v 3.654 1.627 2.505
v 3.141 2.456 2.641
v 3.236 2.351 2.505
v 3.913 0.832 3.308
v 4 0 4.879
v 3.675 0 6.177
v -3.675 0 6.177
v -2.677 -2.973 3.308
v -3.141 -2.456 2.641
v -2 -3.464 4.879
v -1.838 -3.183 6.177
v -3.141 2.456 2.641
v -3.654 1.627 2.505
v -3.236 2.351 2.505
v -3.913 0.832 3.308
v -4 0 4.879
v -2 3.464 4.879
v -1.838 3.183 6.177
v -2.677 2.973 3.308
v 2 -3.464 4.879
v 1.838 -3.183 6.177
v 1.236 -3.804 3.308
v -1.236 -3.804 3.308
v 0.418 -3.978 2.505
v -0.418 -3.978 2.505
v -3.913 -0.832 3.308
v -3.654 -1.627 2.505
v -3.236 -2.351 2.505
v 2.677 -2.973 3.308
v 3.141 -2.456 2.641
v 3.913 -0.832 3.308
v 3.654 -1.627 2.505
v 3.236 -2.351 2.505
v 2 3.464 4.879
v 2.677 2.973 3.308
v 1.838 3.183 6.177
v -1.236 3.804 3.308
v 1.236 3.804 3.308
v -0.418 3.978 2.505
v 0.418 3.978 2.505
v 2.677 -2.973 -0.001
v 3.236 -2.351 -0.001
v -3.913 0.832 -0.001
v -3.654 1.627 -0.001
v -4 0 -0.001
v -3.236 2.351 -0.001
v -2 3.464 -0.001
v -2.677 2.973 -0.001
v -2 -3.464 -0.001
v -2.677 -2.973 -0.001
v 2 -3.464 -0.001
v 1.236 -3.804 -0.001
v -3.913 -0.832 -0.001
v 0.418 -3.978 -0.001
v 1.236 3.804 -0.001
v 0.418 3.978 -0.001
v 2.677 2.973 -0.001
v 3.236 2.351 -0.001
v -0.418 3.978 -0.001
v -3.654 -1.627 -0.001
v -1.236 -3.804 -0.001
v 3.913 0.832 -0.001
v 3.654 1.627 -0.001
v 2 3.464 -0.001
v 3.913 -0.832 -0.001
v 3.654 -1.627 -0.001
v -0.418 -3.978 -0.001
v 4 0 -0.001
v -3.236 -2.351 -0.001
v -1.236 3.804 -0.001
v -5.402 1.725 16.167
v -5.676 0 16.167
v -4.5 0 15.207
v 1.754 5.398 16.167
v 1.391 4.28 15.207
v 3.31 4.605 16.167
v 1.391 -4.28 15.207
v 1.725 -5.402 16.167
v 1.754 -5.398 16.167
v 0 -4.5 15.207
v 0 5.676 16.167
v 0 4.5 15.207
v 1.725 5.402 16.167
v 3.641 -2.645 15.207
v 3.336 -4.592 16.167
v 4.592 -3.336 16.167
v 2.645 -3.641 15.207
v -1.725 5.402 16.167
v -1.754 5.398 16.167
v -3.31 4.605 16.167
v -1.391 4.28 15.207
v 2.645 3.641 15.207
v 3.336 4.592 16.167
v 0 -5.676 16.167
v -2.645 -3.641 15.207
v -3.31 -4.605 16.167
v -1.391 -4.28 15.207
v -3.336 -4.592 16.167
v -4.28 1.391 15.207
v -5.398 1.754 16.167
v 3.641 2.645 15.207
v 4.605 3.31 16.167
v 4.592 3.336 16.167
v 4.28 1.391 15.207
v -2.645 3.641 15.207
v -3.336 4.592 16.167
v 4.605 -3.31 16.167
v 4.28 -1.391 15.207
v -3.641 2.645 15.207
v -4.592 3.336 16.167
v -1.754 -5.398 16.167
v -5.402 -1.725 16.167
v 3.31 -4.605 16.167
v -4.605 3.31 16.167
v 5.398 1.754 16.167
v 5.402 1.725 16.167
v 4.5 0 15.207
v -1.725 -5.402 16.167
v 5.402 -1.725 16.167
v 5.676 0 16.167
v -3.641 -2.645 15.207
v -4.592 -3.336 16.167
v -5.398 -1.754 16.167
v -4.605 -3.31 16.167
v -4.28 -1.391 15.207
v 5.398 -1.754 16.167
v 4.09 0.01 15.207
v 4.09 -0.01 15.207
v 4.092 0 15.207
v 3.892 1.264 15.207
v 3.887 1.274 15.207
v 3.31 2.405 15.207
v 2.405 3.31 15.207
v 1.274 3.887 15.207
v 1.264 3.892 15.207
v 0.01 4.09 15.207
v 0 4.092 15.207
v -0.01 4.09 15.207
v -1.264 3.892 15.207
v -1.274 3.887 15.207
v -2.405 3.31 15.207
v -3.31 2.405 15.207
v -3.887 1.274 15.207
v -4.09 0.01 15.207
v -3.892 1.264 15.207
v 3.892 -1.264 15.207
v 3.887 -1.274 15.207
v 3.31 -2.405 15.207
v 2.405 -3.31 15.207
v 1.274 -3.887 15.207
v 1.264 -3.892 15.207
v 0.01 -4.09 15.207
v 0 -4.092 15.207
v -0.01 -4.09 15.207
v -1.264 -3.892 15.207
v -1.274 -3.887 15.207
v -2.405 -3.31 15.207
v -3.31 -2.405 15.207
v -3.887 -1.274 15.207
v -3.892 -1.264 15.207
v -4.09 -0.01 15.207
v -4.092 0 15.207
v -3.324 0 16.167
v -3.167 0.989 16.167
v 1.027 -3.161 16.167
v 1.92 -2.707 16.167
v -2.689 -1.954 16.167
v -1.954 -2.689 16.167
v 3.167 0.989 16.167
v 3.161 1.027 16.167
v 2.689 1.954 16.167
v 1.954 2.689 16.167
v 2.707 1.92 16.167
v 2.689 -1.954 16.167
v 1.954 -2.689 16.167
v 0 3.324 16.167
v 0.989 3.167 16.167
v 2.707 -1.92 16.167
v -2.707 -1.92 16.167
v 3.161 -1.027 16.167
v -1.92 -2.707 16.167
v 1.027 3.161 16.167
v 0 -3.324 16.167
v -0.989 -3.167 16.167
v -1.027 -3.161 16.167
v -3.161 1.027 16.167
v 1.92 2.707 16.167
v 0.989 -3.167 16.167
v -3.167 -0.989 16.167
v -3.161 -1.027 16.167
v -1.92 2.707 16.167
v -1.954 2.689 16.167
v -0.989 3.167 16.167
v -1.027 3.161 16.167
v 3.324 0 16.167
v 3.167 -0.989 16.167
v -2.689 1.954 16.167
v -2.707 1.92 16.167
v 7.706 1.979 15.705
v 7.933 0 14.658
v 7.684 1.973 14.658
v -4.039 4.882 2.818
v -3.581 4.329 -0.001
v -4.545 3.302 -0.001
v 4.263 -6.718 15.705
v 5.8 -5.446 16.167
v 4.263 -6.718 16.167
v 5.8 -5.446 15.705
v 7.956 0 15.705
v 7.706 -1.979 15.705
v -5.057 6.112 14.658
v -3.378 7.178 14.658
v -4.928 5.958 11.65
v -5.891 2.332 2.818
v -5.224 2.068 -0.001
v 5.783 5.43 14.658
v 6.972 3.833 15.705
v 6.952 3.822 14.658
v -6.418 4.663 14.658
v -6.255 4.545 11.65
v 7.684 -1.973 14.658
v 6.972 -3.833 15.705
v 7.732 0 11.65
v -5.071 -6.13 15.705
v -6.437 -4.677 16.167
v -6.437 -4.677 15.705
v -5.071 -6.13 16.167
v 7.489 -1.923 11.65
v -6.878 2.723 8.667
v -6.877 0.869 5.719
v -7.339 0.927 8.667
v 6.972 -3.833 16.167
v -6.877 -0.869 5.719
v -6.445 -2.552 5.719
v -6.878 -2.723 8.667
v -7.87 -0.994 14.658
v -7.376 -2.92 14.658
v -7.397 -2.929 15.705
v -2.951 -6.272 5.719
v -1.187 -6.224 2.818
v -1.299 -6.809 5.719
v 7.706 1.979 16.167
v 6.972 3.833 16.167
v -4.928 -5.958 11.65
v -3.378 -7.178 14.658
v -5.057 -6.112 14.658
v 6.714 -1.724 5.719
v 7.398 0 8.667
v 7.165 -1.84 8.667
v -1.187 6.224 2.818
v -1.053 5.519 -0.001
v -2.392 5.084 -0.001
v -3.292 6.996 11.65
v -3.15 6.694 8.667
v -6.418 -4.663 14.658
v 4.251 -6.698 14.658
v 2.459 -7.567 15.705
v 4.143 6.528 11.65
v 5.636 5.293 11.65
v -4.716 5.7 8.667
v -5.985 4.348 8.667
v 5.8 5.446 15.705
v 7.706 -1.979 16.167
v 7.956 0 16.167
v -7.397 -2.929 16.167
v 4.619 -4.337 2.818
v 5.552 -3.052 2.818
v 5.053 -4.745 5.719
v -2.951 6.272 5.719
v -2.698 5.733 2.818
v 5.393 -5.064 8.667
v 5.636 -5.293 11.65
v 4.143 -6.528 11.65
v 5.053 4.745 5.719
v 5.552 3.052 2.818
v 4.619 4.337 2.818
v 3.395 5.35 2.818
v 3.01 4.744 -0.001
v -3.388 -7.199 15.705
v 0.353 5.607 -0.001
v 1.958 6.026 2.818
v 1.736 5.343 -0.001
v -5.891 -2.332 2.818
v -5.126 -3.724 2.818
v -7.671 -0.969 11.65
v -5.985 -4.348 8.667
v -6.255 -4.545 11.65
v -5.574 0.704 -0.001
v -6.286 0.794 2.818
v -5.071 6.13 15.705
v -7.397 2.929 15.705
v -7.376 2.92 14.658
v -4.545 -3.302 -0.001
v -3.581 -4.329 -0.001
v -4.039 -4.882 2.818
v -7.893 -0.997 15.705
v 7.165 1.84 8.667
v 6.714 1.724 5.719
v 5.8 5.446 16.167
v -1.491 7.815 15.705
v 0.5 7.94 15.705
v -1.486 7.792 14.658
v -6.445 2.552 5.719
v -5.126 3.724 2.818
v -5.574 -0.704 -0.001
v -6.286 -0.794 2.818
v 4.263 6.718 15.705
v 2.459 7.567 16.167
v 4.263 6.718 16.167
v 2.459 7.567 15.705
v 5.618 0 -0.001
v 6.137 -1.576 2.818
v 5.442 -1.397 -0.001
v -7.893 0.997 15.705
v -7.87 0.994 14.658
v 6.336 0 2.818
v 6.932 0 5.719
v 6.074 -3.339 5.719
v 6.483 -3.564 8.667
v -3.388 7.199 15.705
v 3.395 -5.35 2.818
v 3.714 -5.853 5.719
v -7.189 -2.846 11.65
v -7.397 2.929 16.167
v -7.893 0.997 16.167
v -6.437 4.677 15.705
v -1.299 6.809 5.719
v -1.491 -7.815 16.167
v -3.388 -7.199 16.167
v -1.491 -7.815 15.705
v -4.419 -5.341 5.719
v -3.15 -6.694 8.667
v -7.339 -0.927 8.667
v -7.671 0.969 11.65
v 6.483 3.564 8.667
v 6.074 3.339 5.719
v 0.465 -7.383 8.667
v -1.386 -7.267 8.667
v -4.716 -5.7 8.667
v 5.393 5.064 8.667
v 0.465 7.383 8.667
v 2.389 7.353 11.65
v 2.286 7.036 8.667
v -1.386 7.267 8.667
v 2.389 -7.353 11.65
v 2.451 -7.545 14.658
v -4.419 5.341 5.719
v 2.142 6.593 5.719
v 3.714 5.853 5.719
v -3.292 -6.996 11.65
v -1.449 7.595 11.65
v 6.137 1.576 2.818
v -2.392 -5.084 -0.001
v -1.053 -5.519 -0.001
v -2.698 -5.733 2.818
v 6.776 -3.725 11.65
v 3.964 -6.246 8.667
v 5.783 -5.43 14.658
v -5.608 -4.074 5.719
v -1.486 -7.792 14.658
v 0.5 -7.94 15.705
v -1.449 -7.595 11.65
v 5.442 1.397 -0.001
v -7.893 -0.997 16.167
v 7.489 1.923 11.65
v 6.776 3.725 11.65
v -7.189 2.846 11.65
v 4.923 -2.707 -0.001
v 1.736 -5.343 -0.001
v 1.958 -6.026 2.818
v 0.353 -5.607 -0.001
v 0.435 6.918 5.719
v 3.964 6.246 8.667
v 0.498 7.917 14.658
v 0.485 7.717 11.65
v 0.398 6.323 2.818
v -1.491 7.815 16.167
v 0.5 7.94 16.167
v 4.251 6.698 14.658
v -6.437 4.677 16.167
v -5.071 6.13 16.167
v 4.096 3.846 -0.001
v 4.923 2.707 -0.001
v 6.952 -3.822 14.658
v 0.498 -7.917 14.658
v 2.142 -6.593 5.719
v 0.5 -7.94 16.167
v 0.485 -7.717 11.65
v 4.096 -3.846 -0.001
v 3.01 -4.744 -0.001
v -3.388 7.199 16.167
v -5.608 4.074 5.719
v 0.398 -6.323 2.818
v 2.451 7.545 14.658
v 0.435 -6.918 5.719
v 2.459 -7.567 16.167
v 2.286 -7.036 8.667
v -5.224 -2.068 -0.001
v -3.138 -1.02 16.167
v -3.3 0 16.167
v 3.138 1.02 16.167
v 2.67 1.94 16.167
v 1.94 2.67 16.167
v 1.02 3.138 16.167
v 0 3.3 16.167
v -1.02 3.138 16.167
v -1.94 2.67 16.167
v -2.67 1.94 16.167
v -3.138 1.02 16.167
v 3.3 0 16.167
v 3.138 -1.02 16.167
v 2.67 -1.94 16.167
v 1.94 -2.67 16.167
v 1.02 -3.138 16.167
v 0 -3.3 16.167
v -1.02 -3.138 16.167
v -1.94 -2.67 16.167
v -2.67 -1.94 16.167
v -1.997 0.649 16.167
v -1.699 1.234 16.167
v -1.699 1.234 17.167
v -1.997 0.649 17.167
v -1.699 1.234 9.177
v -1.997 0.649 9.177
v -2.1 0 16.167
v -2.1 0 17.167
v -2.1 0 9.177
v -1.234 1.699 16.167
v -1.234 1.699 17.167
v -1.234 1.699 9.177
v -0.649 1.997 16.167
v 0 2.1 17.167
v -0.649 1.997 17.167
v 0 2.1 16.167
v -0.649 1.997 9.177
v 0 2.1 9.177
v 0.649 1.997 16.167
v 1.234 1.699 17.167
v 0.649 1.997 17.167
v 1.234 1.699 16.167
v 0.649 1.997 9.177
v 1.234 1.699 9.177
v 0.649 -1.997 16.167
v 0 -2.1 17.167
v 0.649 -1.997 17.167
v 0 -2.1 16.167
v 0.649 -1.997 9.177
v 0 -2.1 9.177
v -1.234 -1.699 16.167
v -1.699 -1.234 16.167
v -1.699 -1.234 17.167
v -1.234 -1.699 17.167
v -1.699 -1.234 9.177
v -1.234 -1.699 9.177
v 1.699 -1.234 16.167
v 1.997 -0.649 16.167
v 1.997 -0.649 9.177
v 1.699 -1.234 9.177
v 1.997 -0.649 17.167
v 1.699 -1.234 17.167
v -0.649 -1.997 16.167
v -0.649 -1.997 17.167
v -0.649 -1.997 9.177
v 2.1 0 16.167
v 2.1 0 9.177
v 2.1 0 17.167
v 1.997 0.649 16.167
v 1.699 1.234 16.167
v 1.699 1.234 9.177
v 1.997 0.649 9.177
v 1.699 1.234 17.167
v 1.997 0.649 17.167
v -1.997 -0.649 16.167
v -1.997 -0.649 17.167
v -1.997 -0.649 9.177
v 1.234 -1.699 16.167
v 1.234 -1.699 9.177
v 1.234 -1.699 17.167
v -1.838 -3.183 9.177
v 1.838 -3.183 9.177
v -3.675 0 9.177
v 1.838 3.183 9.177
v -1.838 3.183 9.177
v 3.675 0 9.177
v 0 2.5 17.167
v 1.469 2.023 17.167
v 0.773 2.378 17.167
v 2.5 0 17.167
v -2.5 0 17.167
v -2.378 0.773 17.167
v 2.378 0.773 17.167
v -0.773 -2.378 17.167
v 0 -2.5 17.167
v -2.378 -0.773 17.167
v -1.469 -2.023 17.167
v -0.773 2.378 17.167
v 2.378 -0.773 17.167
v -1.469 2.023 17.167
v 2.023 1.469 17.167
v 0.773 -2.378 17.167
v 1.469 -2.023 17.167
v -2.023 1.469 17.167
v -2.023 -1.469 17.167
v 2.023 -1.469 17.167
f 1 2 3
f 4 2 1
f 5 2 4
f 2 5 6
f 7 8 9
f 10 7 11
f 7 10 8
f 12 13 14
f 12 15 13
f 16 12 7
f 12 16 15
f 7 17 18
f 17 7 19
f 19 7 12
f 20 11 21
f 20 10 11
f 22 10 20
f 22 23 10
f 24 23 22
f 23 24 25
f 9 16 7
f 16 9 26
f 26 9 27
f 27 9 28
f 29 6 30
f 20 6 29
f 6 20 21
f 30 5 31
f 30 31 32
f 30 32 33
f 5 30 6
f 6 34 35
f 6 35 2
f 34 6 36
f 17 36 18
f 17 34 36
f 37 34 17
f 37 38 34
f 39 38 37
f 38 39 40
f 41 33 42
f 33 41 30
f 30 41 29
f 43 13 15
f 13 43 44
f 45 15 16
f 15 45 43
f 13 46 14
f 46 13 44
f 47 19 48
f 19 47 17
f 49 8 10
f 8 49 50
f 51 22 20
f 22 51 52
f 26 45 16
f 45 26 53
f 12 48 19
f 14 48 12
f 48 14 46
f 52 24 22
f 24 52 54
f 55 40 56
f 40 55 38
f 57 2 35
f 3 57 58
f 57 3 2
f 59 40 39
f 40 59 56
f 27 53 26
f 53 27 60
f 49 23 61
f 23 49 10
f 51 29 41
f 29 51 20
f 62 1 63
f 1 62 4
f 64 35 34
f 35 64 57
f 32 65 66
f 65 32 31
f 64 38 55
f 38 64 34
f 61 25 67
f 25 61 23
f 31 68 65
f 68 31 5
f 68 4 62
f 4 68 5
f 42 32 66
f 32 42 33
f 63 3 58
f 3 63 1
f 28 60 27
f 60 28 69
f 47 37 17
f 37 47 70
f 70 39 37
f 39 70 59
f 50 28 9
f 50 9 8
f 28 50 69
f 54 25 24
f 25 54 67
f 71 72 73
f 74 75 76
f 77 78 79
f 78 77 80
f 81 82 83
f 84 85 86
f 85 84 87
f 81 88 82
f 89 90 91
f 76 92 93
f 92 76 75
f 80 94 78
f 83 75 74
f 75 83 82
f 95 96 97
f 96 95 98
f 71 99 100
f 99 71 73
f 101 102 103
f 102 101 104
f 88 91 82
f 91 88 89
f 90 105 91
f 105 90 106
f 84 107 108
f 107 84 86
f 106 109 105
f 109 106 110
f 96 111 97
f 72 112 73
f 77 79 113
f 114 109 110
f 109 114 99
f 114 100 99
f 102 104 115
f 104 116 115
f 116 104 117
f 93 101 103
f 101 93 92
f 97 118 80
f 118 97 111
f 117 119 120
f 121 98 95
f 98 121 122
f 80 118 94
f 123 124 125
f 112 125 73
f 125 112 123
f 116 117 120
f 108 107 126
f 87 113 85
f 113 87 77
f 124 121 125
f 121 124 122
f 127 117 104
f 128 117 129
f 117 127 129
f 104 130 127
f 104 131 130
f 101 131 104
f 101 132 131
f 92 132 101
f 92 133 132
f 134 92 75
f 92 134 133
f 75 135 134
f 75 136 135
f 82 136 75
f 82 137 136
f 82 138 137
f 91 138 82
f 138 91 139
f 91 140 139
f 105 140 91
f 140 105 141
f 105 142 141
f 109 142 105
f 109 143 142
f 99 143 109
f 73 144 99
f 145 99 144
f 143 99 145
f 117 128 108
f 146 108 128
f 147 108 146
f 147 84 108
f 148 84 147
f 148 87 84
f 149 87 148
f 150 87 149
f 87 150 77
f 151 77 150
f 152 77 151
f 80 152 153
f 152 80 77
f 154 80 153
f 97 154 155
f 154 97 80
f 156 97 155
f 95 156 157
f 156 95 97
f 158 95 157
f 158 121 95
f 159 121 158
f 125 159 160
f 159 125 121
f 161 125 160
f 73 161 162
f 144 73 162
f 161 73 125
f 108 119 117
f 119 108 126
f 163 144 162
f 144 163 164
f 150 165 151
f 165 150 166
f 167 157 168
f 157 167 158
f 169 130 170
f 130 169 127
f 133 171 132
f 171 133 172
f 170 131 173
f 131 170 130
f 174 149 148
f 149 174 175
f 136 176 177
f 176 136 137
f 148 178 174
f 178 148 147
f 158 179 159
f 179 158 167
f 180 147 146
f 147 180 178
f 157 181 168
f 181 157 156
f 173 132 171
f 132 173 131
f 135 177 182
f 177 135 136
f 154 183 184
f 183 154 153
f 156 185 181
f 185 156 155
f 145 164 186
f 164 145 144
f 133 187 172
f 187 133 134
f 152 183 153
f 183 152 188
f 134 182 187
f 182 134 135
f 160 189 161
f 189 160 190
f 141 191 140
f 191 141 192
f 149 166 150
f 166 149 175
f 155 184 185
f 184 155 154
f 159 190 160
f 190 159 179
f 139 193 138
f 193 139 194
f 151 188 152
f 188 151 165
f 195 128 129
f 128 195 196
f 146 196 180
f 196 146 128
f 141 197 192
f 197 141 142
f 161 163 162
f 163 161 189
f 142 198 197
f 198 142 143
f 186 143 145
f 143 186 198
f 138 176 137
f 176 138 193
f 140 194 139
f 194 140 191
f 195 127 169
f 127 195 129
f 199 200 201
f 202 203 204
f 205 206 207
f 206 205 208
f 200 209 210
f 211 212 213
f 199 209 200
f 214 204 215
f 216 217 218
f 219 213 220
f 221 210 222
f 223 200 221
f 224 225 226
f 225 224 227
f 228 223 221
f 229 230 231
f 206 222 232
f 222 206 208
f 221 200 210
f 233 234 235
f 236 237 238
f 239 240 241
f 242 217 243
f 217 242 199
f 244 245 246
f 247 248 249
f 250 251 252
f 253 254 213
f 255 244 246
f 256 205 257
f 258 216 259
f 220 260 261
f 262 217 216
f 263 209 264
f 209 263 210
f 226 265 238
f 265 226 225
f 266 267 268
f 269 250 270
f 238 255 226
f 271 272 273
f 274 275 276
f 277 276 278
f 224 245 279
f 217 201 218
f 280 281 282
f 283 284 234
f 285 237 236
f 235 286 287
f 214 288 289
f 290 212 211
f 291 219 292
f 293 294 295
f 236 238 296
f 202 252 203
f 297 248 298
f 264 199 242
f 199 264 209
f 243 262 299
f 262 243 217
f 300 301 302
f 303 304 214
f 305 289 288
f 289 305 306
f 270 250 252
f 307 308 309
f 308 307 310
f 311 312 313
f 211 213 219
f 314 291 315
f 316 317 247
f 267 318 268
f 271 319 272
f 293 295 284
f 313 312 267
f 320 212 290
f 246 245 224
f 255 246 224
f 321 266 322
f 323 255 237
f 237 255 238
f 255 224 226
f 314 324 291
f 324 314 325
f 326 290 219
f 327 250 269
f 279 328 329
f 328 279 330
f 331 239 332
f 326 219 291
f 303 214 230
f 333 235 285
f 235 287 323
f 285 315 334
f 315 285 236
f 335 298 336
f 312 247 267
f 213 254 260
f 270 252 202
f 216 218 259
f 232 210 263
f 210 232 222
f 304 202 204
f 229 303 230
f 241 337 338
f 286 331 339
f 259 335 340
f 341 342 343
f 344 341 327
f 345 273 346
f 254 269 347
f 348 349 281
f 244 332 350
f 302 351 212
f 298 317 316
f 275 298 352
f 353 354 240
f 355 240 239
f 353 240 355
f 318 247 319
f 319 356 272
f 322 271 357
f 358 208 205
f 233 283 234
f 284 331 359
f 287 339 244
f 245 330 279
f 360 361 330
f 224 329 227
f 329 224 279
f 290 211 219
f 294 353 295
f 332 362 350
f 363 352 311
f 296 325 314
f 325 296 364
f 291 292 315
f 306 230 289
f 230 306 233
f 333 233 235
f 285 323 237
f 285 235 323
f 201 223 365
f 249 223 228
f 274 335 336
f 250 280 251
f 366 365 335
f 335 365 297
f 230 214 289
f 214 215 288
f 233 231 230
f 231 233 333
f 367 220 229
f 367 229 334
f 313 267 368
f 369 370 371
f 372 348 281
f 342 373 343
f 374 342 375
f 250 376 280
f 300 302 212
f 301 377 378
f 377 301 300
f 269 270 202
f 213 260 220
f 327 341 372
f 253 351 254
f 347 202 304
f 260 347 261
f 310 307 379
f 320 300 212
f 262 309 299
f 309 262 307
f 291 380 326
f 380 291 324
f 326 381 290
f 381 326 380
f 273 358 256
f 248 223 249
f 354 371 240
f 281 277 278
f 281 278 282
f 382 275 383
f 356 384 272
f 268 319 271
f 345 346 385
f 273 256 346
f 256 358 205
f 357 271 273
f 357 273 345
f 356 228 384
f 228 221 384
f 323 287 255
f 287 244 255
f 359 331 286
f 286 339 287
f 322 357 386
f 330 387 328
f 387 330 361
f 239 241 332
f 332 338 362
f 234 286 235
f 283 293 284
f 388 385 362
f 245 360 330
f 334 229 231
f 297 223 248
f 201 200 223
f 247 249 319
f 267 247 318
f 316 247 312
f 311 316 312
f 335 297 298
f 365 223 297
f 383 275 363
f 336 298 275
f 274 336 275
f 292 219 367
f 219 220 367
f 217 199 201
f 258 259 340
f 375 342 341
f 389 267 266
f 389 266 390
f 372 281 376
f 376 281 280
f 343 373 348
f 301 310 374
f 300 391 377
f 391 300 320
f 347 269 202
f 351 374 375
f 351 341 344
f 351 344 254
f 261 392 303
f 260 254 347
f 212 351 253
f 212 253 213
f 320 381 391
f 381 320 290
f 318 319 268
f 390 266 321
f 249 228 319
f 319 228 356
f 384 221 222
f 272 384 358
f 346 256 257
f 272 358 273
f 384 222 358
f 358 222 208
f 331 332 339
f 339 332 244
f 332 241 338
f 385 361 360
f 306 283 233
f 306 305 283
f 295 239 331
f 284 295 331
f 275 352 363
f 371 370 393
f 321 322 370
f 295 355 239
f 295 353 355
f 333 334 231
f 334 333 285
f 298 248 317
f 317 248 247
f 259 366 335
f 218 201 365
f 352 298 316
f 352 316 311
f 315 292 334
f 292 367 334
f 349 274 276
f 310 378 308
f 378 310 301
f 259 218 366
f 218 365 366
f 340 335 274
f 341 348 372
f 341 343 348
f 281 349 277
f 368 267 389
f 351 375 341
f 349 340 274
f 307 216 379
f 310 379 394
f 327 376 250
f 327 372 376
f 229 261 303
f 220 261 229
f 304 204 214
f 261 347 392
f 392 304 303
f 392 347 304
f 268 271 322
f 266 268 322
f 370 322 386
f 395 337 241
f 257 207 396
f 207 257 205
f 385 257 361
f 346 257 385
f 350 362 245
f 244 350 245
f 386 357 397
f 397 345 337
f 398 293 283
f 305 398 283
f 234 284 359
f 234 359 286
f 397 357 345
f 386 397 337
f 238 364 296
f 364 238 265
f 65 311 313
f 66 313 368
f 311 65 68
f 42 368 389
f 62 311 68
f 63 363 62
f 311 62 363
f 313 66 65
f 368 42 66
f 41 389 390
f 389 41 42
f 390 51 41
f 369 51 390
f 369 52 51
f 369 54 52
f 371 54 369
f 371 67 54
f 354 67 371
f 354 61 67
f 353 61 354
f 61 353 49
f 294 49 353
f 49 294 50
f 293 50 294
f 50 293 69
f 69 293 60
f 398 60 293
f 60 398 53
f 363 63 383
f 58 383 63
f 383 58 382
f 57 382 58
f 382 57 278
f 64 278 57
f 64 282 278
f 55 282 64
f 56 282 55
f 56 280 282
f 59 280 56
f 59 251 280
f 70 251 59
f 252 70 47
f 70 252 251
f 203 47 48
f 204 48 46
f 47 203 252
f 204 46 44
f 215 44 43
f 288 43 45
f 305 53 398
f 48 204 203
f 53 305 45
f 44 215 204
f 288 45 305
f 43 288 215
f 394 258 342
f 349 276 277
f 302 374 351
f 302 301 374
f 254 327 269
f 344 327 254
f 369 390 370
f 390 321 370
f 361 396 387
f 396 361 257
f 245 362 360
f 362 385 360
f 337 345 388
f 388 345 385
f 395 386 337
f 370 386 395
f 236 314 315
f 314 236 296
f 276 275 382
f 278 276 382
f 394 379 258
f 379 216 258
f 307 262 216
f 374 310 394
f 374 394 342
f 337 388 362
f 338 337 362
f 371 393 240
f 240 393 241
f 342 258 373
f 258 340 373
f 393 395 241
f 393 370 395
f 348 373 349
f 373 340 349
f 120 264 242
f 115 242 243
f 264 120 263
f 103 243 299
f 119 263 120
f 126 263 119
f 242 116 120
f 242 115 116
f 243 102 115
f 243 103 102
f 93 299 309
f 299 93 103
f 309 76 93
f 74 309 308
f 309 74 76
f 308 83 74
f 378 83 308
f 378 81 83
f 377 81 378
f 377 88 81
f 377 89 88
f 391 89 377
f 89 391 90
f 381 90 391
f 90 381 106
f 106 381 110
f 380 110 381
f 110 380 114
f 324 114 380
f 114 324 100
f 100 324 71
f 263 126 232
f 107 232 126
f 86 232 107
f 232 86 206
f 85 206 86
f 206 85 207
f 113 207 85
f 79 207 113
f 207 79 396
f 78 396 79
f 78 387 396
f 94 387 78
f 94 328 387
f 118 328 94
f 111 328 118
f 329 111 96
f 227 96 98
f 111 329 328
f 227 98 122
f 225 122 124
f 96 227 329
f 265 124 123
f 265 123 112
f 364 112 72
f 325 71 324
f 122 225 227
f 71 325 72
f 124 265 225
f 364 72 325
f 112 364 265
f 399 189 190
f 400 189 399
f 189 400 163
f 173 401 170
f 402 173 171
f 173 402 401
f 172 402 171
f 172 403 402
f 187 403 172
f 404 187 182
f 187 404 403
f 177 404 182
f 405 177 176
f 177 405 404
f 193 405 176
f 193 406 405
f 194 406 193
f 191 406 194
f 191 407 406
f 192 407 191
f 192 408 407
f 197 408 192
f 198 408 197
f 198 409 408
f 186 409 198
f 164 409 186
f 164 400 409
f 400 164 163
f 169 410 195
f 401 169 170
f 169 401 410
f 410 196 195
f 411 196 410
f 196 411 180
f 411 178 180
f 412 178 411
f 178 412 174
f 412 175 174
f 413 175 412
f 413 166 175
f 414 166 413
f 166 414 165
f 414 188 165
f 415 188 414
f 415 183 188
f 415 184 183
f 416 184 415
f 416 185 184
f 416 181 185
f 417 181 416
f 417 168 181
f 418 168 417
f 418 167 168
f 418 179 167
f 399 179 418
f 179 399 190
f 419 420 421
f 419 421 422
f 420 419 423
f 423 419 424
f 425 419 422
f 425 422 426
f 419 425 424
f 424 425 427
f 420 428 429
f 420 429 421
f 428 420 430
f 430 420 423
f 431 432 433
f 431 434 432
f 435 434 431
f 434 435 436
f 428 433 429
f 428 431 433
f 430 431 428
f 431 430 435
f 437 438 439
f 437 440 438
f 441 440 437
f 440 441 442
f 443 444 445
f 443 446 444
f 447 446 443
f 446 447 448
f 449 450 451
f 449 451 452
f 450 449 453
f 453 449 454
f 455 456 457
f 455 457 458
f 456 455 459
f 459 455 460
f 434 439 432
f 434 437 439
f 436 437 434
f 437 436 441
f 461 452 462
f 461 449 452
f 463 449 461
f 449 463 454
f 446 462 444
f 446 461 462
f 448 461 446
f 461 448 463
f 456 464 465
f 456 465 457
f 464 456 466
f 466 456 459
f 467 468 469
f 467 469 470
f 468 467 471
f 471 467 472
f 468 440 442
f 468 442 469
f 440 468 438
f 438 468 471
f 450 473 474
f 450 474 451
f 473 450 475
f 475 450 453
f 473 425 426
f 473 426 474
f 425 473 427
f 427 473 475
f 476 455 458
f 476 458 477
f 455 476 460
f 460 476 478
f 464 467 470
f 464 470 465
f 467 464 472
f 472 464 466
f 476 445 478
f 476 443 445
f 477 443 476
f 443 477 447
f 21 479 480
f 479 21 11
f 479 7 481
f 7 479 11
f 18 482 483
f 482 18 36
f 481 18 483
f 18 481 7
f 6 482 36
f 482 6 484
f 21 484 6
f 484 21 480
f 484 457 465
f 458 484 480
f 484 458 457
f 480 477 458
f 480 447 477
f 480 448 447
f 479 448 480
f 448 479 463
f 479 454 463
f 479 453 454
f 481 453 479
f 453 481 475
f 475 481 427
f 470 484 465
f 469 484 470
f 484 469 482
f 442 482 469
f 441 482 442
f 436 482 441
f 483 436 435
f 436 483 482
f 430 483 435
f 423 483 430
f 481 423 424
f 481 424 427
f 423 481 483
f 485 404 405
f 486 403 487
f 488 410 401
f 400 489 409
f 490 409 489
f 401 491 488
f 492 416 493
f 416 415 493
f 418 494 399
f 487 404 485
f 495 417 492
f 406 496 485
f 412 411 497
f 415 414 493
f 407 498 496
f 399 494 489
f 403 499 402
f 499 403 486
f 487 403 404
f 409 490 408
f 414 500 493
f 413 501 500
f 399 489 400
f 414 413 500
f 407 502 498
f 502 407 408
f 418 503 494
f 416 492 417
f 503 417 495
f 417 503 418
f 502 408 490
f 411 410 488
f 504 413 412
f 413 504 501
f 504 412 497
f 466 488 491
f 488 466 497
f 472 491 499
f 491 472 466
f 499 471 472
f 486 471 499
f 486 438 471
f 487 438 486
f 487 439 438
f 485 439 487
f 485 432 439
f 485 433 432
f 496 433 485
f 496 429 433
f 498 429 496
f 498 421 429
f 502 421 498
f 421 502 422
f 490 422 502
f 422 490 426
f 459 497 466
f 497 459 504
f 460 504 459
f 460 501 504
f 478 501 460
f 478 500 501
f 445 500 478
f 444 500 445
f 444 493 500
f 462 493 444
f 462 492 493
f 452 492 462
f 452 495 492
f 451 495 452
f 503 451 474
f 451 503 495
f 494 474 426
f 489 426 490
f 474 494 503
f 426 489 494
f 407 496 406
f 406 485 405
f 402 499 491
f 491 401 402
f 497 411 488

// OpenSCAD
// file: wheel_parameters.scad
// wheel_parameters.scad
//
// This is a component of a tool to generate Mecanum wheels that meet a variety of
// parameters set in the wheel_parameters.scad file. 
//
// This file contains all the driving parameters for generating the wheel rollers and hub. 
//
// Because of the large number of parameters and the relatively tight constraints of
// mecanum wheels, it takes some tuning to get something that's mechanically workable.
// However, it's easy to change values and watch the entire assembly preview change in
// hub.scad, so the process is not too painful!
//
// By Gregg Christopher, 2015
// This file is public domain. 

// Small "epsilon" value for ensuring manifold geometry. "slop" is easier to type than "manifold."
slop = 0.01;

/* [Main Dimensions] */
// Distance from the hub axle center to the center of the axles of each roller.
wheel_axle_radius = 26;
// Angle of rollers relative to the hub axle. Change this and they're probably not mecanum wheels anymore. 
wheel_angle = 45;
// Number of roller spokes on the hub. 
num_wheels = 7;

// This example is for MR63ZZ bearings, because they are cheap to buy and mecanum wheels use a lot of them.
/* [Bearing Dimensions] */
// Inner diameter of bearing. 
bearing_inner_diameter = 3;
// Outer diameter of bearing, plus extra clearance for printing. Should be a snug fit.
bearing_outer_diameter = 7 + 0.2;
// Width of bearing. 
bearing_width = 3;
// Thickness of printed part holding the bearing in place. 
bearing_holder_width = 3;

/* [Bearing Spacer Dimensions] */
// Width of the bearing spacer at the point where it contacts the bearing.
bearing_inner_contact_min_width = 0.4;
// Width of the spacer when at the roller.
bearing_inner_contact_max_width = 1.2;
// Height of the spacer (distance from the bearing to the main body of he roller.
bearing_inner_contact_height = 1.0;

/* [Wheel Hub Dimensions] */
// Outer radius of the main hub holding the roller wheel spokes. Needs to be small enough to allow clearance for the rollers. 
hub_outer_radius = 15;
// Thickness of the hub wheel. 
hub_thickness = 3;

// Amount to trim off outer edge of hub to make it more printable.
hub_printing_trim = 1; 

// Distance from edge of hub to motor. (Clearance for the rollers to spin without hitting the motor or frame.)
hub_motor_distance = 12; 

/* [Hub Inner Spoke Dimensions] */
// Thickness of the angled spoke from the inner hub to the motor shaft holder.
hub_spoke_thickness = 2.5;
// Number of inner spokes. Does not have to be the same as the number of wheel rollers. 
num_spokes = 7;

/* [Motor Shaft Dimensions] */
// Radius of the solid piece holding the motor shaft, this forms the inner axle of the wheel hub. 
motor_attachment_radius = 4;
// Radius of the motor shaft. Extra clearnace for printing is added in this example. 
motor_shaft_r = 1.5 + 0.5;
// Amount to cut off a keyed motor shaft. Extra added to make it more snug in this example. Ideally pressure-fit, unless a set screw or glue is used. 
motor_shaft_key_inset = 0.5 + 0.2; 
// Length of motor shaft holder. 
motor_shaft_length = 9;

// Please disregard that these variable are prefixed "m3". That's just the size the first version was using. 
// These are more arbitrary parameters that can be changed. 
/* [Roller Screw Axle Dimensions] */
// Radius of the screw. (extra size for printing clearance is added in this example.)
m3_screw_r = 1.5 + 0.6;
m3_screw_shaft_length = 20; // Not counting length of head and nut, add 5mm to actual screw length.
// Radius of the nut is calculated to be the circle containing the nut, plus some extra print clearance. 
m3_nut_radius = 5.5 /2 / cos(30) + 0.5;
// Depth of the captive nut holder in the roller piece. 
m3_nut_holder_depth = 3;
// Overall thickness of the solid portion of the roller between the nut and the bearing spacer. 
m3_nut_holder_thickness = 7;
// Captive nut holder widens at the end of the roller to this radius to ease insertion of the nut.
m3_entrance_clearance_r = 4;

// Calculate the thickness of the main hub section that holds the angled outer hub spokes.
wheel_attachment_thickness = (bearing_outer_diameter + bearing_holder_width*2) * sin(wheel_angle) +
                             bearing_width * sin(wheel_angle);
echo(wheel_attachment_thickness);

// Width of the virtual wheel outline filled by the mecanum wheels.
contact_shape_thickness = 25;
// Height (radial measurement) of the virtual wheel outline filled by the mecanum wheels.
contact_shape_height = 16;

// Preview a sample bearing.
// Note that the bearing previewed here does not scale with parameters.
// If you want to see how a different bearing fits, replace this module. 
// This is included as a demonstration for a particular wheel size. It does not scale with other parameters. 
module MR63ZZ_bearing() {
  difference() {
    cylinder(r = bearing_outer_diameter/2, h = bearing_width, center = true, $fn = 30);
    cylinder(r = bearing_inner_diameter/2, h = bearing_width + 2*slop, center = true, $fn = 20);
  }
}
// main file
// wheel_shape.scad
//
// This is a component of a tool to generate Mecanum wheels that meet a variety of
// parameters set in the wheel_parameters.scad file. 
//
// This file generates the shape of a single wheel spoke roller piece (1/2 of a roller) for
// a mecanum wheel. It attempts to shape the spoke to conform to a "virtual wheel" shape
// that is extruded in a circle around the shaft of the wheel, so that when the spokes rotate
// around their individual shafts while the wheel is spinning, the effective possible 
// contact surface with the ground is very close to that virtual wheel shape. 
//
// This is accomplished by taking the intersection of a cylinder defining the possible
// volume of the spoke, and intersecting it with the virtual wheel shape. A slice of
// that intersection is chosen heuristically (i.e. I hardcoded some math/guesswork),
// and that slice is then rotationally extruded to make the spoke shape. 
//
// A few other geometric features, like a bearing spacer and captive nut holder for]
// using a screw as an axle, are then added/cut into the spoke. 
//
// Much more sophisticated approaches are possible, but surprisingly, this simplistic
// approach produced great results for the configurations I tried.
//
// Because of the large number of parameters and the relatively tight constraints of
// mecanum wheels, it takes some tuning to get something that's mechanically workable.
// However, it's easy to change values and watch the entire assembly preview change in
// hub.scad, so the process is not too painful!
//
// By Gregg Christopher, 2015
// This file is public domain. 

include <wheel_parameters.scad>

// Create a 2D shape that will define the "virtual wheel" to which the rollers will
// attempt to conform. Try different shapes to see weird results!
// y = radial dimension
module wheel_shape_2d() {
  // As an example, uncomment the next two lines to test making rollers with
  // very rounded ends to make a less square wheel cross-section. 
  // Warning! This particular shape increases the poly count, and SCAD might
  // be prohibitively slow.
  //offset(r = 4)
  //offset(r = -4)
  square([contact_shape_height, contact_shape_thickness], center = true);
}

// Calculate intersection points to determine an angle to take a slice of the
// wheel profile. This is not remotely an optimal or particularly elegant solution,
// but it worked well for the wheels I wanted to make. 
x1 = cos(wheel_angle) * contact_shape_height/2;
y1 = sin(wheel_angle) * contact_shape_height/2;

y2 = y1 + contact_shape_thickness/2;
x2 = tan(wheel_angle) * y2;

cross_section_angle = atan(contact_shape_thickness/2 / (x1 + x2));

echo(x1);
echo(x2);
echo(y1);
echo(y2);
echo(cross_section_angle);

module mecanum_wheel_shape_3d() {
  difference() {
    // Create the base spoke shape
    rotate_extrude()
    rotate([180, 0, 90])
    intersection() {
      square([100, 100]);
      // Take a slice of the intersection of the virtual wheel and allowable spoke cylinder. 
      projection(cut = true) 
      rotate([0, 45, 0])
      intersection() {
        translate([0, -wheel_axle_radius, 0])
        rotate_extrude($fn = 100)
        translate([wheel_axle_radius, 0, 0])
        wheel_shape_2d();
        
        rotate([0, wheel_angle, 0])
        cylinder(r = contact_shape_height/2, h = 50, center = true, $fn = 30);
      }
    }
    translate([0, 0, -slop]) cylinder(r = 20, h = bearing_width/2 + 2*slop); // Remove material for hub
    translate([0, 0, bearing_width/2]) cylinder(r = m3_screw_r, h = m3_nut_holder_thickness + slop, $fn = 20); // Screw hole
    translate([0, 0, bearing_width/2 + m3_nut_holder_thickness]) cylinder(r = m3_nut_radius, h = m3_nut_holder_depth + slop, $fn = 6); // Nut holder hole
    // Cutout for screw and nut at the end of the roller. 
    translate([0, 0, bearing_width/2 + m3_nut_holder_thickness + m3_nut_holder_depth])
    intersection() {
       remaining_height = x2 - bearing_width/2 - m3_nut_holder_thickness - m3_nut_holder_depth;
       cylinder(r1 = m3_nut_radius, r2 = m3_nut_radius + remaining_height/4, h = remaining_height, $fn = 6);
       cylinder(r = m3_entrance_clearance_r, h = remaining_height, $fn = 30);
    }
    // Cut out some extra clearance around the bearing spacer.
    // This cavity will collect fluff and other junk forever. It's great. 
    translate([0, 0, bearing_width/2 - slop])
    difference() {
      cylinder(r1 = contact_shape_height/2 - 3.5 + bearing_inner_contact_max_width, r2 = contact_shape_height/2 - 3.5, h = bearing_inner_contact_height - 2*slop, $fn = 20); // Screw hole
      translate([0, 0, -slop]) cylinder(r1 = m3_screw_r + bearing_inner_contact_max_width, r2 = m3_screw_r + 2*bearing_inner_contact_max_width - bearing_inner_contact_min_width, h = bearing_inner_contact_height, $fn = 20); // Screw hole
    }
  }
  // Bearing spacer. Larger designs might want to omit this and go with a manufactured spacer matching the selected bearing. 
  translate([0, 0, bearing_width/2 - bearing_inner_contact_height + slop])
  difference() {
    cylinder(r1 = m3_screw_r + bearing_inner_contact_min_width, r2 = m3_screw_r + bearing_inner_contact_max_width, h = bearing_inner_contact_height, $fn = 20);
    translate([0, 0, -slop]) cylinder(r = m3_screw_r, h = bearing_inner_contact_height + 2*slop, $fn = 20);
  }
}

// Position the roller spoke half for printing
rotate([0, 180, 0])
translate([0, 0, -x2 + 0.48])
mecanum_wheel_shape_3d();
